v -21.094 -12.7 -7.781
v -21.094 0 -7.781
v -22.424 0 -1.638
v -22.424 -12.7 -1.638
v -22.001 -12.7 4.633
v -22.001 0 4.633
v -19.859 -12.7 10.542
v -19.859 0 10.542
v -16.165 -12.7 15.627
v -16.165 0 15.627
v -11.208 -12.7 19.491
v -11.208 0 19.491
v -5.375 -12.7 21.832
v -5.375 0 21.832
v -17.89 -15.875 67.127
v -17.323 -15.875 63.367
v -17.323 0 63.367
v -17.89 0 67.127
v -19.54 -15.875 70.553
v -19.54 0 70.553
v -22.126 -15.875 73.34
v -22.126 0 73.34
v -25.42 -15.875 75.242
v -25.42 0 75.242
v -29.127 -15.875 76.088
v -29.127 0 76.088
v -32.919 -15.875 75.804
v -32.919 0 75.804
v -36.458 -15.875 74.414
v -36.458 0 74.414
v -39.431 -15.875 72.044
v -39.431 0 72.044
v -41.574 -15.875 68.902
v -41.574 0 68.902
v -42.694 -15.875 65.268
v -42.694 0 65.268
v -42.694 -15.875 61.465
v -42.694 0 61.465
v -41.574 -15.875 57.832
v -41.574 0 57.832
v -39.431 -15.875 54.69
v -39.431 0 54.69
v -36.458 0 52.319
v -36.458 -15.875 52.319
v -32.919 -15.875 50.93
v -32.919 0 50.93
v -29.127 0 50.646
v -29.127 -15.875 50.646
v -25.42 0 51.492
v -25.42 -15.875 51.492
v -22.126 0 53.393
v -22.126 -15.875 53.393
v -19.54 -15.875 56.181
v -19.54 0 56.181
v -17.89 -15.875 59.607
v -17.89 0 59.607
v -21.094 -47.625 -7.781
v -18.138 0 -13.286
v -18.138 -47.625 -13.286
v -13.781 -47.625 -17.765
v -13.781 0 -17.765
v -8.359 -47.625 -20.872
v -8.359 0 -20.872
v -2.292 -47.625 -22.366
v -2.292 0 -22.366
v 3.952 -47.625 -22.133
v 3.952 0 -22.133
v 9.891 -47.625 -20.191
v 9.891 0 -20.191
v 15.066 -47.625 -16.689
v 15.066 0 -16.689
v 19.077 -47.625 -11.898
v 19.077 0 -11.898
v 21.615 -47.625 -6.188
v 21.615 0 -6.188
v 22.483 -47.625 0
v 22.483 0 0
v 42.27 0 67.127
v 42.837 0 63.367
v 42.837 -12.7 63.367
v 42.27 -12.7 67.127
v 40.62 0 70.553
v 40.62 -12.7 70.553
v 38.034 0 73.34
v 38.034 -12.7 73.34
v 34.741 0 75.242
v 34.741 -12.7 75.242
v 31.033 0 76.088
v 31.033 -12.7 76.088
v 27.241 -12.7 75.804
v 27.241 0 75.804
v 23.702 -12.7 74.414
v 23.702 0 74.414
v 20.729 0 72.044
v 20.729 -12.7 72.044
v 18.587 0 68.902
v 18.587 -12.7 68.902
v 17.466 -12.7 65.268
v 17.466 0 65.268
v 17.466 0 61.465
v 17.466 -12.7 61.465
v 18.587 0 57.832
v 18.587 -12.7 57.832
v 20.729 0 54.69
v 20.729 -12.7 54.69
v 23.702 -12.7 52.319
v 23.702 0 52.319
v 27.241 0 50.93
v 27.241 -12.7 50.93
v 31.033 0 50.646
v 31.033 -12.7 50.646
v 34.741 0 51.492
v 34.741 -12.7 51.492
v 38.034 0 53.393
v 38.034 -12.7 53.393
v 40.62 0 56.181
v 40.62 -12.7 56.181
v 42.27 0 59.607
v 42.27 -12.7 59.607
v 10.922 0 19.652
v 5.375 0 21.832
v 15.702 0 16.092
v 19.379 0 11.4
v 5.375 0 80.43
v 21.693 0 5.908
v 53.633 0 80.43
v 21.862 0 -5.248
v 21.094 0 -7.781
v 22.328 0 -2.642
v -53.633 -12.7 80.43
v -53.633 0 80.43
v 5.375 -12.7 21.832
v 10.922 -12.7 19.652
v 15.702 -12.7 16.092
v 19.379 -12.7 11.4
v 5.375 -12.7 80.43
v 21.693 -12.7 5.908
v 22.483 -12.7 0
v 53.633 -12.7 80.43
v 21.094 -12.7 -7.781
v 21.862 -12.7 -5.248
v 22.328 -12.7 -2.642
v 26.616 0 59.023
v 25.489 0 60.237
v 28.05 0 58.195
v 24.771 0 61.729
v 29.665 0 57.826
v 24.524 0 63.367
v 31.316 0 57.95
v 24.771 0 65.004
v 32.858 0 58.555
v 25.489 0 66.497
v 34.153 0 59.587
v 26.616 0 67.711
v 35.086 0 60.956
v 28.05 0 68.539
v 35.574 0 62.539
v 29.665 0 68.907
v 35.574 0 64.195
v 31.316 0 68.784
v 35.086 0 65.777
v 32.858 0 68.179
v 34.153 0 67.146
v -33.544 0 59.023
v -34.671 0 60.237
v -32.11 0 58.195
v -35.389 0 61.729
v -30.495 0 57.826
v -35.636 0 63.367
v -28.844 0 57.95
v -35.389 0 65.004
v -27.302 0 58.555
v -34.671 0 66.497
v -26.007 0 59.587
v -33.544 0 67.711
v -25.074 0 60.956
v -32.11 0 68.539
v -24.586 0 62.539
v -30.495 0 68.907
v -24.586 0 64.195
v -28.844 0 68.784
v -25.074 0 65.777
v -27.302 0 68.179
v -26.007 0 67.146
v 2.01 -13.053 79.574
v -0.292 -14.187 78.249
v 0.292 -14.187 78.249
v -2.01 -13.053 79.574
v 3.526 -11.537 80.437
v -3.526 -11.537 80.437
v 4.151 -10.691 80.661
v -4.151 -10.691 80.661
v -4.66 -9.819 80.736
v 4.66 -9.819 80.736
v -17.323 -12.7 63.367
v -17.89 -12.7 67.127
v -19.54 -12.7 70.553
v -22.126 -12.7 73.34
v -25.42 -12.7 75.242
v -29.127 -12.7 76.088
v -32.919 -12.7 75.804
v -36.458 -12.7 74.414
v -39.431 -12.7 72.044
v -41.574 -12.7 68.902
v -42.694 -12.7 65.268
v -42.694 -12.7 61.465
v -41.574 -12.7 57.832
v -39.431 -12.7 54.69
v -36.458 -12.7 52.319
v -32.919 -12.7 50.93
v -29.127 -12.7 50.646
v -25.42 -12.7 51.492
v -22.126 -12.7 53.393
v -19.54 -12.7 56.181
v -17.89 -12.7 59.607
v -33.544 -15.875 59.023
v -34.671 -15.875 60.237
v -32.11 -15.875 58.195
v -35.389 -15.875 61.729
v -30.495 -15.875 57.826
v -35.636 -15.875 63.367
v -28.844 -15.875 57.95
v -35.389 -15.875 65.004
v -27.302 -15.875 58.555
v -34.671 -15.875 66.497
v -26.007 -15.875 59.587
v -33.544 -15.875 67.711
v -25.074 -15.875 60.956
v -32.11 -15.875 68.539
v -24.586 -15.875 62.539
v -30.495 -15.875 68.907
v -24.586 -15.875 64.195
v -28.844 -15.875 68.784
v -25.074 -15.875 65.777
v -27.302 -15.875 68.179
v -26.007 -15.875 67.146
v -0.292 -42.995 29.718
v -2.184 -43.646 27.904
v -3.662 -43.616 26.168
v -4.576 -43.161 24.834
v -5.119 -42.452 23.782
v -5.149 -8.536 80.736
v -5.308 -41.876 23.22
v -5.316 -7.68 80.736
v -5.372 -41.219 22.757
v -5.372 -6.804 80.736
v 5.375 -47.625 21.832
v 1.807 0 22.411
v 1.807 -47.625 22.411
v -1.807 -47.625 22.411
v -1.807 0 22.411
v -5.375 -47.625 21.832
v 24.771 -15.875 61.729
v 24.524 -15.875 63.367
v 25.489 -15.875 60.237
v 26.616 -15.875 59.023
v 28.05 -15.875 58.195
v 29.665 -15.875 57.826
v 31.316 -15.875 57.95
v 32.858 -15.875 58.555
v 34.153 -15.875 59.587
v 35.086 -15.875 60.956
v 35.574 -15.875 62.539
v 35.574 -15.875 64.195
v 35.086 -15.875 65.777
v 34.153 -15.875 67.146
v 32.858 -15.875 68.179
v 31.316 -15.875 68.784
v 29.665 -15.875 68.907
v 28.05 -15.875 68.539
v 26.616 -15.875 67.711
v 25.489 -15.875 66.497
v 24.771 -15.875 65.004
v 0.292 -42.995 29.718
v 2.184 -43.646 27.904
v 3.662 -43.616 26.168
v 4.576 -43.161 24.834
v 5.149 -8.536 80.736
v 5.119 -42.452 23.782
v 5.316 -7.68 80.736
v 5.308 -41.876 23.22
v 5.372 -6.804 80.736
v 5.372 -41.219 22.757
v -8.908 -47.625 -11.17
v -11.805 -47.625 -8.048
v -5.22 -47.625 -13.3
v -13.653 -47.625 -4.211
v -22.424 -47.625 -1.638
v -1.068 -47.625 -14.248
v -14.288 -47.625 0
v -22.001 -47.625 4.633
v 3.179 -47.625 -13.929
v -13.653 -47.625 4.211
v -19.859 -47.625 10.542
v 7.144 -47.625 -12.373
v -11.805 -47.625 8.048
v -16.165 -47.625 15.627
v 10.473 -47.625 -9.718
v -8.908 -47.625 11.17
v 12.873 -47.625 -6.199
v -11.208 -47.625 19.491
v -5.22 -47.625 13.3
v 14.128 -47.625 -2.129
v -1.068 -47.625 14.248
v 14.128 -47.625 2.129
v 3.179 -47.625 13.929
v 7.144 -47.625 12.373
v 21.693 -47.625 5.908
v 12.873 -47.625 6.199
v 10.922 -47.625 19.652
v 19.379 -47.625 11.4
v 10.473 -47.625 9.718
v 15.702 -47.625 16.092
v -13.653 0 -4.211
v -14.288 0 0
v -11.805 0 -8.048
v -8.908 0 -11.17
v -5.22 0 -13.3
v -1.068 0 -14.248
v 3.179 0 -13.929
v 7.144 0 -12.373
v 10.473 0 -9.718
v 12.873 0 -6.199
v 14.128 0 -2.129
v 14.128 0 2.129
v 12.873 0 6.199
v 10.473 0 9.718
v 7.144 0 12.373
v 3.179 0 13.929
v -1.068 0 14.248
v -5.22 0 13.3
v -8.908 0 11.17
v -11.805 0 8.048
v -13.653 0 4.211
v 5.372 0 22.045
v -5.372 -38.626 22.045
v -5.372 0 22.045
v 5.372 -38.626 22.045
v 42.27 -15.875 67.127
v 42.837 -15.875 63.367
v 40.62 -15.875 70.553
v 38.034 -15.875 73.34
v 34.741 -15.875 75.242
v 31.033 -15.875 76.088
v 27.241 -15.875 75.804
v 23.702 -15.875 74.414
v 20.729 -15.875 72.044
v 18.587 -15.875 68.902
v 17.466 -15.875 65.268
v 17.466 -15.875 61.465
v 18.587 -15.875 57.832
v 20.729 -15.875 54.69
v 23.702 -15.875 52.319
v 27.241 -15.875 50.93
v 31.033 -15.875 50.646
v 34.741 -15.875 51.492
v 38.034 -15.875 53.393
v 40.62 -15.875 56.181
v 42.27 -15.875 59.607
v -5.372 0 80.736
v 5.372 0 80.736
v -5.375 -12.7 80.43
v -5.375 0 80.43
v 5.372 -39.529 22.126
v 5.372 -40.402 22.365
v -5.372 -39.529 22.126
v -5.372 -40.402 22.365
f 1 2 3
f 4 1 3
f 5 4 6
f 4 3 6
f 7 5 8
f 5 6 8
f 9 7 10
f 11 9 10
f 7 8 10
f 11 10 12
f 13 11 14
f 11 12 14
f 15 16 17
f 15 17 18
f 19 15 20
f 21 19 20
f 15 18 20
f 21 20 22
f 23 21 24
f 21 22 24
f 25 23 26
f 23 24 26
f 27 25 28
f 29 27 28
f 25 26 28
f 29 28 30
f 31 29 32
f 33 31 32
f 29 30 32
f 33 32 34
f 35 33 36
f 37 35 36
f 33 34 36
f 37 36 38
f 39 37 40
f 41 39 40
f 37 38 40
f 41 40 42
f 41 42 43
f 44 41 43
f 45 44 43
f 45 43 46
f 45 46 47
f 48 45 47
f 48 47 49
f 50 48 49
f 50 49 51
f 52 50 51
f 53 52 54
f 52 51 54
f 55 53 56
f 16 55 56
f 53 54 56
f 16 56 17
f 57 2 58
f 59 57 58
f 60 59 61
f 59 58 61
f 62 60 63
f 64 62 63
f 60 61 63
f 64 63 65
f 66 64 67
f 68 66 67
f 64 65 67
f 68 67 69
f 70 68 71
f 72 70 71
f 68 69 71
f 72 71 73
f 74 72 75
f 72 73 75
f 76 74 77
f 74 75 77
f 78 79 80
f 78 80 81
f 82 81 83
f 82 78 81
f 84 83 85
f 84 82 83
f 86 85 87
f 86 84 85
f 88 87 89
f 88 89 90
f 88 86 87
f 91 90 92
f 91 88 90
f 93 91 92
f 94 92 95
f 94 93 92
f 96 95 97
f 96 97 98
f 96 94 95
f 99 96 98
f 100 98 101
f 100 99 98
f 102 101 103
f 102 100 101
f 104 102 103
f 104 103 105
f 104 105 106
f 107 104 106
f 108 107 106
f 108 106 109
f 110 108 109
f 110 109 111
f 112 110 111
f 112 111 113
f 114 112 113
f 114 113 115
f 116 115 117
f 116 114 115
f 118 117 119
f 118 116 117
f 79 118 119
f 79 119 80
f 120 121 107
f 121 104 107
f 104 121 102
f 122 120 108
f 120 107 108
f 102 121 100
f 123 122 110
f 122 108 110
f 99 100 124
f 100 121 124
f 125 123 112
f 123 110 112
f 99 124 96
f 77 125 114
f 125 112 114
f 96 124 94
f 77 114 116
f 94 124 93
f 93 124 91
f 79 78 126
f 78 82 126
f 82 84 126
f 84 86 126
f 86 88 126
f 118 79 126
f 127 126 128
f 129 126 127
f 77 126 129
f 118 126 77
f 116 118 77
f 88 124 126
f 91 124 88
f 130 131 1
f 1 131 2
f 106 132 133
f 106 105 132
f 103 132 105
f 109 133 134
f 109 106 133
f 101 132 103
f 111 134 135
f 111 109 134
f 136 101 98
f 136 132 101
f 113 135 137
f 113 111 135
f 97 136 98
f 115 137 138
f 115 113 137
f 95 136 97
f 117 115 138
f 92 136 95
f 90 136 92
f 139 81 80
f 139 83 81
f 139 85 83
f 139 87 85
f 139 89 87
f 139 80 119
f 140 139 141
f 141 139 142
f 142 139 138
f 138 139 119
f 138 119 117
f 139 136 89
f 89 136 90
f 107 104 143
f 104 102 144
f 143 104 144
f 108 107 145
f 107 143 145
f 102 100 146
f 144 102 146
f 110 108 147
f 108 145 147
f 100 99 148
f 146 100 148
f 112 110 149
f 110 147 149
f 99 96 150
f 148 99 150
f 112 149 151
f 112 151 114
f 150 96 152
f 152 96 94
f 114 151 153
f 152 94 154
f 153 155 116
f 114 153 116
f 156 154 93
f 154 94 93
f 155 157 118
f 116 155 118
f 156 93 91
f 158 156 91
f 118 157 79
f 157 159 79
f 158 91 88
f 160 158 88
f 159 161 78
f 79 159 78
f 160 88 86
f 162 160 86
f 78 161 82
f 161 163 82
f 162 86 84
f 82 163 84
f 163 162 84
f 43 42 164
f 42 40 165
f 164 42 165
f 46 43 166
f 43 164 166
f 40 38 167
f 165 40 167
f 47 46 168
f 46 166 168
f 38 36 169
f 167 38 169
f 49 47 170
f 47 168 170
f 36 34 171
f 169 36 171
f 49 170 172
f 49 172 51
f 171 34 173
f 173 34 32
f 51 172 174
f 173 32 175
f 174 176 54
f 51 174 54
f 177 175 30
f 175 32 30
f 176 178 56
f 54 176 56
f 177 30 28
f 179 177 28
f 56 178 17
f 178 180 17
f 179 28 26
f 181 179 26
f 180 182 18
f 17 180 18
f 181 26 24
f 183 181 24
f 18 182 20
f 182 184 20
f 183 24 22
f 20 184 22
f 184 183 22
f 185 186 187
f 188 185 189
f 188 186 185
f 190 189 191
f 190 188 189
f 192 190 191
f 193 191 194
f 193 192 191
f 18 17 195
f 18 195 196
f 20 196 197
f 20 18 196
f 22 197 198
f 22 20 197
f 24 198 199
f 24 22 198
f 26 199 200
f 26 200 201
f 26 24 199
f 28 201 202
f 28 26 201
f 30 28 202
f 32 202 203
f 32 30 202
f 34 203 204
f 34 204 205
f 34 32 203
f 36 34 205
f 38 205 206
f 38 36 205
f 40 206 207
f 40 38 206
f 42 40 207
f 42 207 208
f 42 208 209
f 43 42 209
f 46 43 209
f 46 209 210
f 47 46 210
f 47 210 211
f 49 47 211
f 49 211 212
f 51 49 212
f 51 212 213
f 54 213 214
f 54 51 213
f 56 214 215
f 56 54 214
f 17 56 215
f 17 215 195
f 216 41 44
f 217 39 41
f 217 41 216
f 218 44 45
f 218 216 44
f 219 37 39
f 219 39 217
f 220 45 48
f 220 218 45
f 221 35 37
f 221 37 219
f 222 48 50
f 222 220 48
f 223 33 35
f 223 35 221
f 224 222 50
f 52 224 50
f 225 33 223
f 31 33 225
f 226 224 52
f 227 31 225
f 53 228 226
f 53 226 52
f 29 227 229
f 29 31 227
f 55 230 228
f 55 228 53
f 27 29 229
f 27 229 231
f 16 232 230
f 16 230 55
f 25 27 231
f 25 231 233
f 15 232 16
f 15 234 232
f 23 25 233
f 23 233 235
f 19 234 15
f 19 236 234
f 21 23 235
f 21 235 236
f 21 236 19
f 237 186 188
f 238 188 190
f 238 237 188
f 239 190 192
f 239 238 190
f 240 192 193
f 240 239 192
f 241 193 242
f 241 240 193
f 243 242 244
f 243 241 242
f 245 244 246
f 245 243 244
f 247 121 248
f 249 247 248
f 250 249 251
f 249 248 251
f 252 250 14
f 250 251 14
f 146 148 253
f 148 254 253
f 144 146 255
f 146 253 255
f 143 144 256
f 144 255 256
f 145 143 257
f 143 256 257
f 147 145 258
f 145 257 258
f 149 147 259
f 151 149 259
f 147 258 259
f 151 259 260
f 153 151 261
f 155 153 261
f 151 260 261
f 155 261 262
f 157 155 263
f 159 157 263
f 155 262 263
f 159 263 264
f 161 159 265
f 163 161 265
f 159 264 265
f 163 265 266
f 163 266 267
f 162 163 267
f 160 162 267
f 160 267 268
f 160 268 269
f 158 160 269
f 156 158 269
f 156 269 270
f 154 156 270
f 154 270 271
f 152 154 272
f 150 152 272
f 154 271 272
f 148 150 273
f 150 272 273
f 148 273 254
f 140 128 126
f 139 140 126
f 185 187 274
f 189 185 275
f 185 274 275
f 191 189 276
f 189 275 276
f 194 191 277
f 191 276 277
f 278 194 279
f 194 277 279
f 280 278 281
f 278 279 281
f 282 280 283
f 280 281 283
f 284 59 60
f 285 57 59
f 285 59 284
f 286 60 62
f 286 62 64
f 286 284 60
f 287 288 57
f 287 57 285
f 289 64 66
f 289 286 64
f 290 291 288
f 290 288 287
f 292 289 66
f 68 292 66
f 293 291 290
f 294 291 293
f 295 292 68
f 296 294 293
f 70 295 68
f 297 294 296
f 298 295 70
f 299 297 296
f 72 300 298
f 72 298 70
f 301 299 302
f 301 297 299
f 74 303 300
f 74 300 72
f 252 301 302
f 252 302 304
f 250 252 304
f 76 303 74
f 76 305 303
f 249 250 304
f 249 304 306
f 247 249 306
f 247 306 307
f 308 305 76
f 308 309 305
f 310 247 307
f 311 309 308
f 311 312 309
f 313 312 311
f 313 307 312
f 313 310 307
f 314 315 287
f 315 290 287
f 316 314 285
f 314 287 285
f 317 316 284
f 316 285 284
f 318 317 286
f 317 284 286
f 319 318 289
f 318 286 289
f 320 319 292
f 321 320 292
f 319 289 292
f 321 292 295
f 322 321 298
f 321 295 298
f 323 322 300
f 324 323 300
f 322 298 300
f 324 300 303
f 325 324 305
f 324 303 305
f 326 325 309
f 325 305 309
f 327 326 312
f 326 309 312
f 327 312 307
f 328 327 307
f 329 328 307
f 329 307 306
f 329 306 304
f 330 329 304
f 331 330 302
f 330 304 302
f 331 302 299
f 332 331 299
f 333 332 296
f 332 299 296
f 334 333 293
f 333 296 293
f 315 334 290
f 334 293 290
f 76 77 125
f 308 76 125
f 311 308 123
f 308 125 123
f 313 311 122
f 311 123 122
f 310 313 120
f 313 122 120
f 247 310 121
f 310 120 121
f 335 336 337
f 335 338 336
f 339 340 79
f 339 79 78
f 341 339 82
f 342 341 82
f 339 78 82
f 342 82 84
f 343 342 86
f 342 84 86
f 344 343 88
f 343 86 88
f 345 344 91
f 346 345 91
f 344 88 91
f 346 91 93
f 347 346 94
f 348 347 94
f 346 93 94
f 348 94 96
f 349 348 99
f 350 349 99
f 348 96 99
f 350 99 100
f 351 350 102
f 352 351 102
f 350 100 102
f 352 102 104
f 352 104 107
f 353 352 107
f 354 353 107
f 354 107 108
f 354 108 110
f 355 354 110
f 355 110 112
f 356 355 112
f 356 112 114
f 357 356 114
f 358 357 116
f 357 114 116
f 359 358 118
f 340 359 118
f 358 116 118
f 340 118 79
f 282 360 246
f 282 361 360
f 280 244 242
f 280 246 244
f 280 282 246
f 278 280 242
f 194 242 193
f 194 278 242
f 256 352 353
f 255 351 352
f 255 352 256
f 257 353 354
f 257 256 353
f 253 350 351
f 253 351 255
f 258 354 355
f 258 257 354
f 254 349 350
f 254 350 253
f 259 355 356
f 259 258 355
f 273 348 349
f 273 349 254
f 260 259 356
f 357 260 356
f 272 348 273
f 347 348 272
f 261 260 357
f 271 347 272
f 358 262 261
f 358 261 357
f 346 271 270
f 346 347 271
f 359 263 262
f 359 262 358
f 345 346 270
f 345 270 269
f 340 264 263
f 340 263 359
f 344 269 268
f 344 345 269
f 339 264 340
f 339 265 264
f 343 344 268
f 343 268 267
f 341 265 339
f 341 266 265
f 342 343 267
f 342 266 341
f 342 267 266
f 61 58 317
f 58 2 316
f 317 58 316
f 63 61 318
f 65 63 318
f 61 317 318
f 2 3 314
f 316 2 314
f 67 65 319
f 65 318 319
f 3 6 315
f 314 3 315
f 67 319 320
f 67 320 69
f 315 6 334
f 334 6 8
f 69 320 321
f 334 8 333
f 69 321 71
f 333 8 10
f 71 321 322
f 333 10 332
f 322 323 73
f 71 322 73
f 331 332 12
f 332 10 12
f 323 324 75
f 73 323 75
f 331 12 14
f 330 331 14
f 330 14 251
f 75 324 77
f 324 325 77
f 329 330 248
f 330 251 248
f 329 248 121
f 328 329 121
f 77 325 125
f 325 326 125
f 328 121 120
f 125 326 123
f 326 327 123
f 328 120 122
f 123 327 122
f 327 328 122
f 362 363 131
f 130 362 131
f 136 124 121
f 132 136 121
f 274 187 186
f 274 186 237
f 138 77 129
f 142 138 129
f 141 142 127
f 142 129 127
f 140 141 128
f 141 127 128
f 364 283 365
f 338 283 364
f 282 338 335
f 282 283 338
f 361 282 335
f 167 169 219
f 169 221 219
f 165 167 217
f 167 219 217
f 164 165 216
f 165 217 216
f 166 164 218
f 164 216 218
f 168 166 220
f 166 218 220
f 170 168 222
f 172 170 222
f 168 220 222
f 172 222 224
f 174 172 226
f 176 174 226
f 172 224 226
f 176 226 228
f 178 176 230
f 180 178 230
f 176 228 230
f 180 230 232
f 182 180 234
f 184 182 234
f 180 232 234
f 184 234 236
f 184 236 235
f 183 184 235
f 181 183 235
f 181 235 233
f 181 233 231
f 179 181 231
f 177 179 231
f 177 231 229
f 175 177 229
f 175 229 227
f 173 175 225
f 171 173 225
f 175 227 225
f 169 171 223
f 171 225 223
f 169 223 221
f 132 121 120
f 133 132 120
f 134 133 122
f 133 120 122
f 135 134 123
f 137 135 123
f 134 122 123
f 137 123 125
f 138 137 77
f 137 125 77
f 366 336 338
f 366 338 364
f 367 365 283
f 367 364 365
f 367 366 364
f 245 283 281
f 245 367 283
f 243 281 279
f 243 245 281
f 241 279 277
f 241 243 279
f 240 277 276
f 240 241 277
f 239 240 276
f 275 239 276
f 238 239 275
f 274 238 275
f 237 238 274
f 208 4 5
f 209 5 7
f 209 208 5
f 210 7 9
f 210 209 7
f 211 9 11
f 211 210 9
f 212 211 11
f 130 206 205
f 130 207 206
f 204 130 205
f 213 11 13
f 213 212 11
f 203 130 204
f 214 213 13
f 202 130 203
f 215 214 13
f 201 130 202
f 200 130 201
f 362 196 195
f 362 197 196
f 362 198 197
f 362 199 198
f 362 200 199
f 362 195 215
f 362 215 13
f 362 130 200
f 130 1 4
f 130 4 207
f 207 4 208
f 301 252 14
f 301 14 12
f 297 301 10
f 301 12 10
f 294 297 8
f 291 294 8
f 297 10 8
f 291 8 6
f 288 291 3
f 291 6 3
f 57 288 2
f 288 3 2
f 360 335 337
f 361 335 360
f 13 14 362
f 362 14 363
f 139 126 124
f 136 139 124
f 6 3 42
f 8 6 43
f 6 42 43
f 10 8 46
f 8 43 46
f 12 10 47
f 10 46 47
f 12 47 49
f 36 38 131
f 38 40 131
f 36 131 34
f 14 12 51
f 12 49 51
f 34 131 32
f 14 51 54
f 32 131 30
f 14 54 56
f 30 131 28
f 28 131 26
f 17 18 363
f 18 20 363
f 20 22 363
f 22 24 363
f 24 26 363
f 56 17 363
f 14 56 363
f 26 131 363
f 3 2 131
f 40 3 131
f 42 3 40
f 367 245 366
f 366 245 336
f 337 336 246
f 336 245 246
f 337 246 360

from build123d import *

# Parameters (mm, degrees)
F0_R          = 12.7567686724
F1_DEPTH      = 12.7
F2_DEPTH      = 15.875
F3_DEPTH      = 47.625
F5_DEPTH      = 5.3721
F5_DEPTH_BACK = 5.3721
F6_D          = 11.1125
F6_DEPTH      = 15.875
F6_TIP        = 3.3385318145
F6_2_D        = 11.1125
F6_2_DEPTH    = 15.875
F6_2_TIP      = 3.3385318145
F7_D          = 28.575
F7_DEPTH      = 47.625
F7_TIP        = 8.5847960944
F8_R          = 5.08


with BuildPart() as f1:
    # F0 (on Front) → F1 (new body)
    with BuildSketch(Plane.XZ):
        with BuildLine():
            ThreePointArc((-21.0940879488, -7.7810234971), (-19.8589195471, 10.541735506), (-5.3748115897, 21.8315430841))
            Line((-5.3748115897, 21.8315430841), (-5.3748115897, 80.4299041629))
            Line((-5.3748115897, 80.4299041629), (-53.632657975, 80.4299041629))
            Line((-53.632657975, 80.4299041629), (-21.0940879488, -7.7810234971))
        make_face()
        with Locations((-30.0800949335, 63.3666962385)):
            Circle(F0_R, mode=Mode.SUBTRACT)
    extrude(amount=F1_DEPTH)


with BuildPart() as f1b:
    # F0 (on Front) → F1, piece 2 (new body)
    with BuildSketch(Plane.XZ):
        with BuildLine():
            ThreePointArc((5.3748115897, 21.8315430841), (17.696738441, 13.8683207926), (22.4834355261, 0))
            ThreePointArc((22.4834355261, 0), (22.1333734409, -3.9520441777), (21.0940879627, -7.7810234596))
            Line((21.0940879627, -7.7810234596), (53.632657975, 80.4299041629))
            Line((53.632657975, 80.4299041629), (5.3748115897, 80.4299041629))
            Line((5.3748115897, 80.4299041629), (5.3748115897, 21.8315430841))
        make_face()
        with Locations((30.0800949335, 63.3666962385)):
            Circle(F0_R, mode=Mode.SUBTRACT)
    extrude(amount=F1_DEPTH)


with BuildPart() as f2:
    # F0 (on Front) → F2 (new body)
    with BuildSketch(Plane.XZ):
        with Locations((-30.0800949335, 63.3666962385)):
            Circle(F0_R)
    extrude(amount=F2_DEPTH)

    # F6
    with Locations(Plane(origin=(0, 0, 0), x_dir=(1, 0, 0), z_dir=(0, 1, 0))):
        with Locations((-30.0800949335, -63.3666962385), (30.0800949335, -63.3666962385)):
            Hole(F6_D / 2, depth=F6_DEPTH)
            with Locations((0, 0, -(F6_DEPTH + F6_TIP / 2))):  # 118° drill point
                Cone(0, F6_D / 2, F6_TIP, mode=Mode.SUBTRACT)


with BuildPart() as f2b:
    # F0 (on Front) → F2, piece 2 (new body)
    with BuildSketch(Plane.XZ):
        with Locations((30.0800949335, 63.3666962385)):
            Circle(F0_R)
    extrude(amount=F2_DEPTH)

    # F6#2
    with Locations(Plane(origin=(0, 0, 0), x_dir=(1, 0, 0), z_dir=(0, 1, 0))):
        with Locations((-30.0800949335, -63.3666962385), (30.0800949335, -63.3666962385)):
            Hole(F6_2_D / 2, depth=F6_2_DEPTH)
            with Locations((0, 0, -(F6_2_DEPTH + F6_2_TIP / 2))):  # 118° drill point
                Cone(0, F6_2_D / 2, F6_2_TIP, mode=Mode.SUBTRACT)


with BuildPart() as f3:
    # F0 (on Front) → F3 (new body)
    with BuildSketch(Plane.XZ):
        with BuildLine():
            ThreePointArc((21.0940879627, -7.7810234596), (22.1333734409, -3.9520441777), (22.4834355261, 0))
            ThreePointArc((22.4834355261, 0), (17.696738441, 13.8683207926), (5.3748115897, 21.8315430841))
            ThreePointArc((5.3748115897, 21.8315430841), (0, 22.4834355261), (-5.3748115897, 21.8315430841))
            ThreePointArc((-5.3748115897, 21.8315430841), (-19.8589195471, 10.541735506), (-21.0940879488, -7.7810234971))
            ThreePointArc((-21.0940879488, -7.7810234971), (2e-08, -22.4834355261), (21.0940879627, -7.7810234596))
        make_face()
    extrude(amount=F3_DEPTH)

    # F7
    with Locations(Plane(origin=(0, 0, 0), x_dir=(1, 0, 0), z_dir=(0, 1, 0))):
        with Locations((0, 0)):
            Hole(F7_D / 2, depth=F7_DEPTH)
            with Locations((0, 0, -(F7_DEPTH + F7_TIP / 2))):  # 118° drill point
                Cone(0, F7_D / 2, F7_TIP, mode=Mode.SUBTRACT)


with BuildPart() as f5:
    # F4 (on Right) → F5 (new body, two sides)
    with BuildSketch(Plane.YZ) as f5_sk:
        Polygon((-47.5494302809, 22.0449119806), (0, 22.0449119806), (0, 80.7362869382), (-12.7112343907, 80.7362869382), align=None)
    extrude(amount=F5_DEPTH)
    extrude(f5_sk.sketch, amount=-F5_DEPTH_BACK)

    # F8
    f8_edges = [f5.edges().sort_by_distance(p)[0] for p in [
        (0, -12.711234, 80.736287),
        (5.3721, -30.130332, 51.390599),
        (0, -47.54943, 22.044912),
        (-5.3721, -30.130332, 51.390599),
    ]]
    fillet(f8_edges, radius=F8_R)


solid = Compound([f1.part, f1b.part, f2.part, f2b.part, f3.part, f5.part])
